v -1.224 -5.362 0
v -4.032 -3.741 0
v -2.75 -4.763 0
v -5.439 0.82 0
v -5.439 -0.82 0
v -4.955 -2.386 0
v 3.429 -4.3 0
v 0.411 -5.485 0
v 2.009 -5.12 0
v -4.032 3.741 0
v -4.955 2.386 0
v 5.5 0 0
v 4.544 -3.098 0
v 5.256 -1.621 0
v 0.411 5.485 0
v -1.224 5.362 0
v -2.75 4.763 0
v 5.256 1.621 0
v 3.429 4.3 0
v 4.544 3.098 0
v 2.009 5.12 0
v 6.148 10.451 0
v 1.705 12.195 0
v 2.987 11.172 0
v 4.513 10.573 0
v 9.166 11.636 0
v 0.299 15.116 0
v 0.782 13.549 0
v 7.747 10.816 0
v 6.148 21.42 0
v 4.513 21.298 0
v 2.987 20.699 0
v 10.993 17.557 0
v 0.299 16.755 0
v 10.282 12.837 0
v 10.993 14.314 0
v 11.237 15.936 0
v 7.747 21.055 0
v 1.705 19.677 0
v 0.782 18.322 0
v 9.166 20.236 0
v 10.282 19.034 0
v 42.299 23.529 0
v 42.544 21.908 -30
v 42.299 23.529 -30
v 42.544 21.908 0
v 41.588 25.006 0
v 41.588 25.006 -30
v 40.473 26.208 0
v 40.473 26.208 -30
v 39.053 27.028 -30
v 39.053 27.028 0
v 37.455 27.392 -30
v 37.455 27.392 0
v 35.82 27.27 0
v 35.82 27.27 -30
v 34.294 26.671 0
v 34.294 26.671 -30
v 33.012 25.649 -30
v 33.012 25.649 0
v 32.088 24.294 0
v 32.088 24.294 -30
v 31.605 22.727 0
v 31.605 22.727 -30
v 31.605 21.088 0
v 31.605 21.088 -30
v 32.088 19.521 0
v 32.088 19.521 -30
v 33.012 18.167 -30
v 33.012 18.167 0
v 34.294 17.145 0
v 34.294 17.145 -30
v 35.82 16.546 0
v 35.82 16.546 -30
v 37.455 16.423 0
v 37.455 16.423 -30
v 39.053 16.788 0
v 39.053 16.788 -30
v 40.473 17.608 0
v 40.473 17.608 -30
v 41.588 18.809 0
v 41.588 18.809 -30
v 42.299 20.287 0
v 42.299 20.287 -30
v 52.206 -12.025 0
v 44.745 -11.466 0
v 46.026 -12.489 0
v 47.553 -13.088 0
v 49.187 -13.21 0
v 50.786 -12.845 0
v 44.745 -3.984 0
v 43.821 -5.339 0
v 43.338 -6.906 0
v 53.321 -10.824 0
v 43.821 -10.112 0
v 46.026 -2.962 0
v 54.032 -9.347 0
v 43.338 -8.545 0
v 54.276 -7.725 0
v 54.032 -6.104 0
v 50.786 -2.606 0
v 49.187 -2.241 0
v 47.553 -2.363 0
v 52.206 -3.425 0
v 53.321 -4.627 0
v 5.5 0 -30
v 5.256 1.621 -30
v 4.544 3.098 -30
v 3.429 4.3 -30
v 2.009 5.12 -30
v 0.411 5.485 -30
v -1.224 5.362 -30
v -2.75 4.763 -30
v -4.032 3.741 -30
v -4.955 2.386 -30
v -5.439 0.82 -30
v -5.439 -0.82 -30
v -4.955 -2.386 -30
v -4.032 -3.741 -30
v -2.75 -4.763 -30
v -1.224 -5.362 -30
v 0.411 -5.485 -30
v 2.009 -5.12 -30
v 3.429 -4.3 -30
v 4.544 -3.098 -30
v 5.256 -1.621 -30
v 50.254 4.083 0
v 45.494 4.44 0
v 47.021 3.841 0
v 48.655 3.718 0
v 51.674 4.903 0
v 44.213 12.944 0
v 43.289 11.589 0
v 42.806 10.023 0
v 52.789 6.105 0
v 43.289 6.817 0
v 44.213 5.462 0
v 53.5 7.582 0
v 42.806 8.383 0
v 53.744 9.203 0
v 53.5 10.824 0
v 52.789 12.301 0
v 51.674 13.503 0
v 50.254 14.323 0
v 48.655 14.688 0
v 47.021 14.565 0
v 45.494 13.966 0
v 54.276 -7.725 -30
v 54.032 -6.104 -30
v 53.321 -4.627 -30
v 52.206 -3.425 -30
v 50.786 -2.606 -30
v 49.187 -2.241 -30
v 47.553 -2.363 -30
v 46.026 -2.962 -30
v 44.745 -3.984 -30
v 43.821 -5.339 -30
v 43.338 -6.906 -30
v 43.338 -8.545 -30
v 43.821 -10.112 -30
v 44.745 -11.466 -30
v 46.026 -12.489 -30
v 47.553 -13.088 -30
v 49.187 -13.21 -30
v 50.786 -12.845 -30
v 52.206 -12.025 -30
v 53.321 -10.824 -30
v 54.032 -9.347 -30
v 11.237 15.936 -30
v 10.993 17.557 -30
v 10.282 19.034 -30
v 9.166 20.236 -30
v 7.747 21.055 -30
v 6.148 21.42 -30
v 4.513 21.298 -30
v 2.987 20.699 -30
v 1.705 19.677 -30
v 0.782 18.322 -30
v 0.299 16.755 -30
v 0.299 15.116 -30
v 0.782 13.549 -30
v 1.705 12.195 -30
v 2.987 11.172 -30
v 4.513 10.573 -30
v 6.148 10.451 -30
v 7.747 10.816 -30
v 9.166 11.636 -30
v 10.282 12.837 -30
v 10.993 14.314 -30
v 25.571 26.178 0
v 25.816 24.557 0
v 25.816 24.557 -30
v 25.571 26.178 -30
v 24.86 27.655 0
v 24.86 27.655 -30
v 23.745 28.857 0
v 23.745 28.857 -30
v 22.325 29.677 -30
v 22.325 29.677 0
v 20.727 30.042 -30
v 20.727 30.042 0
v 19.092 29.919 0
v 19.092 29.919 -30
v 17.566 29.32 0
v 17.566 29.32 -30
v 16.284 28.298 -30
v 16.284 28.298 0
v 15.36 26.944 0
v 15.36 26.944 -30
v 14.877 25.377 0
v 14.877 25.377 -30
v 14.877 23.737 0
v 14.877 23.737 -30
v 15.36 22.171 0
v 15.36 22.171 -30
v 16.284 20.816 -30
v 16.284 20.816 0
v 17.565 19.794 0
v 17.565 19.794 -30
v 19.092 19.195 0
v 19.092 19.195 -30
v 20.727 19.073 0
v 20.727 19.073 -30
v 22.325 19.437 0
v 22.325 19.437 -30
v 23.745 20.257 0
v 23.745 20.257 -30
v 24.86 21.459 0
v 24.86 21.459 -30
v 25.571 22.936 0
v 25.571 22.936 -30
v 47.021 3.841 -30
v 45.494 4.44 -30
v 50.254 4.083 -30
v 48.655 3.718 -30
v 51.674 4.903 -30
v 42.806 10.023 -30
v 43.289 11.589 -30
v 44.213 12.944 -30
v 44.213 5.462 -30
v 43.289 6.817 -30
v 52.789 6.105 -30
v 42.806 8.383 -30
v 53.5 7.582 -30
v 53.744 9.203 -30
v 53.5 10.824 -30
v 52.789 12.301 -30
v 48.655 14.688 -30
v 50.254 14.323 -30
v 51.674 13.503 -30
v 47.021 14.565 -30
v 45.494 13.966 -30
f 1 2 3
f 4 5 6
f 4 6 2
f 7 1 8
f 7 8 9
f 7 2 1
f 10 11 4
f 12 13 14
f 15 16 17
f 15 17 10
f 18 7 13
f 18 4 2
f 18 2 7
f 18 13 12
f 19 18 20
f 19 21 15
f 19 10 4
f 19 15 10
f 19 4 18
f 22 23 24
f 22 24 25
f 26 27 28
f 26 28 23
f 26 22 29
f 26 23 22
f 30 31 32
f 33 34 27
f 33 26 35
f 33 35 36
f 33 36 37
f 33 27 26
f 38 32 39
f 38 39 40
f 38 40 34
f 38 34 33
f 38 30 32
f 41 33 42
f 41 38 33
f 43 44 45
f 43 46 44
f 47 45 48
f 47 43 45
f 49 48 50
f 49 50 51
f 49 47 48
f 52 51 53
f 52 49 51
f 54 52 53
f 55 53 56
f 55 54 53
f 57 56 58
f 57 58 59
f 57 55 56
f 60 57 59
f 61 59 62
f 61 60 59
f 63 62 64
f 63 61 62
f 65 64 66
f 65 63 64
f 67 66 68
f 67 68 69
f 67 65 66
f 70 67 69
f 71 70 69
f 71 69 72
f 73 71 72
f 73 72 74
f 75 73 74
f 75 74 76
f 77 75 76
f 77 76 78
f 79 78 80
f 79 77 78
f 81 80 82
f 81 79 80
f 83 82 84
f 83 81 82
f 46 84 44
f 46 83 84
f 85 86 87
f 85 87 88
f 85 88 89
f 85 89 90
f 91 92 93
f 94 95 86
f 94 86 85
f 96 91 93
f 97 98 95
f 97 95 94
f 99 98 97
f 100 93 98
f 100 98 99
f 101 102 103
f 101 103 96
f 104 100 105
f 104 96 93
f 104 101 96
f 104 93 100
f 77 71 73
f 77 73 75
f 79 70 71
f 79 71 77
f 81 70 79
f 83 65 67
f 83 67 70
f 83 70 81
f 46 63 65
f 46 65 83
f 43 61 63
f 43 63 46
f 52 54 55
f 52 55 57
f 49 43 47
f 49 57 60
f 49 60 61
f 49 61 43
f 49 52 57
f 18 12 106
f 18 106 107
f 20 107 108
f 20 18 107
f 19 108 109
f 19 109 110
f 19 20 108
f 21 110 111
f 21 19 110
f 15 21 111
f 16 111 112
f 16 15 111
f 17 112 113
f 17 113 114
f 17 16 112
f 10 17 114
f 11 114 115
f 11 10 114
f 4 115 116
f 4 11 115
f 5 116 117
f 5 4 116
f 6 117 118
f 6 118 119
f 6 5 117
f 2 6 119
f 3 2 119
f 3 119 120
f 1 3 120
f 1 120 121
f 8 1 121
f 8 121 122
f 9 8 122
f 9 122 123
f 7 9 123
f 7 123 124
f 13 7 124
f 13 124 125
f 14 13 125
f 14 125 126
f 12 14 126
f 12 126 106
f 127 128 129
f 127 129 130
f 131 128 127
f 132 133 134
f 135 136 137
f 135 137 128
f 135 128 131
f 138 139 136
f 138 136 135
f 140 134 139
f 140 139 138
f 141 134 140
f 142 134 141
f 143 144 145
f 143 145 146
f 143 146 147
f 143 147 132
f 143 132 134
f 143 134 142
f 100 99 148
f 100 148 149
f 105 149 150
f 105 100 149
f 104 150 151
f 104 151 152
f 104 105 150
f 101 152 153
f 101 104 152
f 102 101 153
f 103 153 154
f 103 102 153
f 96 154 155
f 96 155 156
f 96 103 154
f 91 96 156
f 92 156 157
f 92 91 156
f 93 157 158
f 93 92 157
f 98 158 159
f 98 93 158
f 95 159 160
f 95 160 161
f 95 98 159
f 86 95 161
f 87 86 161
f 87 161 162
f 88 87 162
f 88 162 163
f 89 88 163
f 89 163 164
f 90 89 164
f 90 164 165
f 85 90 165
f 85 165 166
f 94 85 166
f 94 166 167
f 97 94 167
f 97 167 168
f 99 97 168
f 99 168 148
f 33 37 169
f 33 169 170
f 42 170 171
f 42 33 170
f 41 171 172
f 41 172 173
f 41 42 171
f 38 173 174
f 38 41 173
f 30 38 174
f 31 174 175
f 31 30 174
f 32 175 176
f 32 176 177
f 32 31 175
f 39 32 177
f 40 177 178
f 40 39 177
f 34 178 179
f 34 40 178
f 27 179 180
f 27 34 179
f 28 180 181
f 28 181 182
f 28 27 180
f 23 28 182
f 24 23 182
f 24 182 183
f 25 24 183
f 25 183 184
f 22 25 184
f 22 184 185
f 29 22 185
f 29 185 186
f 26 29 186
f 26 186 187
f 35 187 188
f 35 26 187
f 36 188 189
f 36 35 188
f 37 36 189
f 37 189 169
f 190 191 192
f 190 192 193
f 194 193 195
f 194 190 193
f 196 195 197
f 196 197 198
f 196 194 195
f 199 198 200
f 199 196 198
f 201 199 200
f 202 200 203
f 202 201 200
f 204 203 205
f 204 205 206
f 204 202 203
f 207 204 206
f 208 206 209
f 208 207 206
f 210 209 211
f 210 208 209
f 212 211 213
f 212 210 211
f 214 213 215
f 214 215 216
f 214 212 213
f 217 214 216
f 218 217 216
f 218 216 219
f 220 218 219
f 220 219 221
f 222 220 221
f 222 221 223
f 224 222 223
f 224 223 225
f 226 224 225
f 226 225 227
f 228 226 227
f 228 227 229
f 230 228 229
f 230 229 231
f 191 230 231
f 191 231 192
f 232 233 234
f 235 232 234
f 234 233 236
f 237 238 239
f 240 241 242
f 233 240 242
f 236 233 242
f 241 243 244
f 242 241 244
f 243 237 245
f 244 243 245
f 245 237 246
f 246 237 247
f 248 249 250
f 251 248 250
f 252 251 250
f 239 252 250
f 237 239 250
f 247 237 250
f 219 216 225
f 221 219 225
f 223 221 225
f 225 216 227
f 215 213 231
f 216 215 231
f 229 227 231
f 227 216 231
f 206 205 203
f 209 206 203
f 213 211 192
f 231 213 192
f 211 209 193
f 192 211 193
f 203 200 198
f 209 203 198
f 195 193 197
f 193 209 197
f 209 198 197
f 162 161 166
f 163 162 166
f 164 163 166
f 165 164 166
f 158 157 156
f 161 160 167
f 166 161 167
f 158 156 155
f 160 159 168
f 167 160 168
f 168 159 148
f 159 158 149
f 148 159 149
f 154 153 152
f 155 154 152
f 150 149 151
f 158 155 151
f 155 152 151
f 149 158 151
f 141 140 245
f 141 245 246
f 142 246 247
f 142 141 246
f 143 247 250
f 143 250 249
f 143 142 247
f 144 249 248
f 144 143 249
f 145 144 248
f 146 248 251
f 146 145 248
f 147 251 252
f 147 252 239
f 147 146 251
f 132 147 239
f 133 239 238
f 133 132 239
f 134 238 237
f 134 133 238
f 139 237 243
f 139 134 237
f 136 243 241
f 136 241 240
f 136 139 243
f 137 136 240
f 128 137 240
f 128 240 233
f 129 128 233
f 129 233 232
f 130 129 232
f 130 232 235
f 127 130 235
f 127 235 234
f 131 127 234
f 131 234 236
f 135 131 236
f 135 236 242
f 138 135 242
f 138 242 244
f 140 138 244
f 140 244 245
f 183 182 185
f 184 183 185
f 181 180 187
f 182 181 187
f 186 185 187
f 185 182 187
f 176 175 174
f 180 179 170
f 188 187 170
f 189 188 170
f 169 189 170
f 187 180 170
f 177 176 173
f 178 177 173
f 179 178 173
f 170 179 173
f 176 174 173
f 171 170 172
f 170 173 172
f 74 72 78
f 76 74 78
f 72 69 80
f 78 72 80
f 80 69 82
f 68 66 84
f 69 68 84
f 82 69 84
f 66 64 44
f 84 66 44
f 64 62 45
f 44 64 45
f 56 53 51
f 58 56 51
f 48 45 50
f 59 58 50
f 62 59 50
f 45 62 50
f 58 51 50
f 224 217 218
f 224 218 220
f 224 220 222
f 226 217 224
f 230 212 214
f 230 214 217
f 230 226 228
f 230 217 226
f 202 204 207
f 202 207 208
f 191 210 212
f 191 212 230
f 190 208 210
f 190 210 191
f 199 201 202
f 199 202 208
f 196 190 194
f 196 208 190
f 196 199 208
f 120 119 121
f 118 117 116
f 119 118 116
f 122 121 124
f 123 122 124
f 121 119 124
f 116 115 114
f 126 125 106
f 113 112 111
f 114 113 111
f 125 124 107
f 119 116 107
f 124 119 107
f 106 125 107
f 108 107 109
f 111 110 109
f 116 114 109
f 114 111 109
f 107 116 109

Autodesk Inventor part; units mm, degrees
ref_plane "YZ Plane" through (0, 0, 0) normal (1, 0, 0) x (0, 1, 0)
ref_plane "XZ Plane" through (0, 0, 0) normal (0, 1, 0) x (-1, 0, 0)
ref_plane "XY Plane" through (0, 0, 0) normal (0, 0, 1) x (1, 0, 0)
ref_plane "Work Plane1" through (0, 0, 0) normal (0, 0, 1) x (1, 0, 0)
sketch "Sketch1" plane through (0, 0, 0) normal (0, 0, 1) x (1, 0, 0)
  circle A0 centre (48.7764, -7.7254) radius 5.5 projected
  circle A1 centre (48.2444, 9.2031) radius 5.5 projected
  circle A2 centre (37.0438, 21.9077) radius 5.5 projected
  circle A3 centre (20.3155, 24.5572) radius 5.5 projected
  circle A4 centre (5.7372, 15.9356) radius 5.5 projected
  circle A5 centre (0, 0) radius 5.5 projected
  arc A6 (-1.1822, 9.4262) -> (6.9193, 6.5094) centre (0, 0) ccw projected
  arc A7 (6.9193, 6.5094) -> (15.2179, 16.5407) centre (5.7372, 15.9356) ccw projected
  arc A8 (15.2179, 16.5407) -> (28.0062, 18.9802) centre (20.3155, 24.5572) ccw projected
  arc A9 (28.0062, 18.9802) -> (39.4147, 12.7083) centre (37.0438, 21.9077) ccw projected
  arc A10 (39.4147, 12.7083) -> (44.2073, 0.6036) centre (48.2444, 9.2031) ccw projected
  arc A11 (44.2073, 0.6036) -> (52.8136, 0.8741) centre (48.7764, -7.7254) ccw projected
  arc A12 (52.8136, 0.8741) -> (45.8736, 18.4025) centre (48.2444, 9.2031) ccw projected
  arc A13 (45.8736, 18.4025) -> (29.3531, 27.4847) centre (37.0438, 21.9077) ccw projected
  arc A14 (29.3531, 27.4847) -> (10.8348, 23.9521) centre (20.3155, 24.5572) ccw projected
  arc A15 (10.8348, 23.9521) -> (-1.1822, 9.4262) centre (5.7372, 15.9356) ccw projected
  point P0 (0, 0)
extrude "Extrusion1" add sketch "Sketch1" against normal blind 30 contours A0 | A1 | A2 | A3 | A4 | A5
properties part number "create hole in pelvis"
